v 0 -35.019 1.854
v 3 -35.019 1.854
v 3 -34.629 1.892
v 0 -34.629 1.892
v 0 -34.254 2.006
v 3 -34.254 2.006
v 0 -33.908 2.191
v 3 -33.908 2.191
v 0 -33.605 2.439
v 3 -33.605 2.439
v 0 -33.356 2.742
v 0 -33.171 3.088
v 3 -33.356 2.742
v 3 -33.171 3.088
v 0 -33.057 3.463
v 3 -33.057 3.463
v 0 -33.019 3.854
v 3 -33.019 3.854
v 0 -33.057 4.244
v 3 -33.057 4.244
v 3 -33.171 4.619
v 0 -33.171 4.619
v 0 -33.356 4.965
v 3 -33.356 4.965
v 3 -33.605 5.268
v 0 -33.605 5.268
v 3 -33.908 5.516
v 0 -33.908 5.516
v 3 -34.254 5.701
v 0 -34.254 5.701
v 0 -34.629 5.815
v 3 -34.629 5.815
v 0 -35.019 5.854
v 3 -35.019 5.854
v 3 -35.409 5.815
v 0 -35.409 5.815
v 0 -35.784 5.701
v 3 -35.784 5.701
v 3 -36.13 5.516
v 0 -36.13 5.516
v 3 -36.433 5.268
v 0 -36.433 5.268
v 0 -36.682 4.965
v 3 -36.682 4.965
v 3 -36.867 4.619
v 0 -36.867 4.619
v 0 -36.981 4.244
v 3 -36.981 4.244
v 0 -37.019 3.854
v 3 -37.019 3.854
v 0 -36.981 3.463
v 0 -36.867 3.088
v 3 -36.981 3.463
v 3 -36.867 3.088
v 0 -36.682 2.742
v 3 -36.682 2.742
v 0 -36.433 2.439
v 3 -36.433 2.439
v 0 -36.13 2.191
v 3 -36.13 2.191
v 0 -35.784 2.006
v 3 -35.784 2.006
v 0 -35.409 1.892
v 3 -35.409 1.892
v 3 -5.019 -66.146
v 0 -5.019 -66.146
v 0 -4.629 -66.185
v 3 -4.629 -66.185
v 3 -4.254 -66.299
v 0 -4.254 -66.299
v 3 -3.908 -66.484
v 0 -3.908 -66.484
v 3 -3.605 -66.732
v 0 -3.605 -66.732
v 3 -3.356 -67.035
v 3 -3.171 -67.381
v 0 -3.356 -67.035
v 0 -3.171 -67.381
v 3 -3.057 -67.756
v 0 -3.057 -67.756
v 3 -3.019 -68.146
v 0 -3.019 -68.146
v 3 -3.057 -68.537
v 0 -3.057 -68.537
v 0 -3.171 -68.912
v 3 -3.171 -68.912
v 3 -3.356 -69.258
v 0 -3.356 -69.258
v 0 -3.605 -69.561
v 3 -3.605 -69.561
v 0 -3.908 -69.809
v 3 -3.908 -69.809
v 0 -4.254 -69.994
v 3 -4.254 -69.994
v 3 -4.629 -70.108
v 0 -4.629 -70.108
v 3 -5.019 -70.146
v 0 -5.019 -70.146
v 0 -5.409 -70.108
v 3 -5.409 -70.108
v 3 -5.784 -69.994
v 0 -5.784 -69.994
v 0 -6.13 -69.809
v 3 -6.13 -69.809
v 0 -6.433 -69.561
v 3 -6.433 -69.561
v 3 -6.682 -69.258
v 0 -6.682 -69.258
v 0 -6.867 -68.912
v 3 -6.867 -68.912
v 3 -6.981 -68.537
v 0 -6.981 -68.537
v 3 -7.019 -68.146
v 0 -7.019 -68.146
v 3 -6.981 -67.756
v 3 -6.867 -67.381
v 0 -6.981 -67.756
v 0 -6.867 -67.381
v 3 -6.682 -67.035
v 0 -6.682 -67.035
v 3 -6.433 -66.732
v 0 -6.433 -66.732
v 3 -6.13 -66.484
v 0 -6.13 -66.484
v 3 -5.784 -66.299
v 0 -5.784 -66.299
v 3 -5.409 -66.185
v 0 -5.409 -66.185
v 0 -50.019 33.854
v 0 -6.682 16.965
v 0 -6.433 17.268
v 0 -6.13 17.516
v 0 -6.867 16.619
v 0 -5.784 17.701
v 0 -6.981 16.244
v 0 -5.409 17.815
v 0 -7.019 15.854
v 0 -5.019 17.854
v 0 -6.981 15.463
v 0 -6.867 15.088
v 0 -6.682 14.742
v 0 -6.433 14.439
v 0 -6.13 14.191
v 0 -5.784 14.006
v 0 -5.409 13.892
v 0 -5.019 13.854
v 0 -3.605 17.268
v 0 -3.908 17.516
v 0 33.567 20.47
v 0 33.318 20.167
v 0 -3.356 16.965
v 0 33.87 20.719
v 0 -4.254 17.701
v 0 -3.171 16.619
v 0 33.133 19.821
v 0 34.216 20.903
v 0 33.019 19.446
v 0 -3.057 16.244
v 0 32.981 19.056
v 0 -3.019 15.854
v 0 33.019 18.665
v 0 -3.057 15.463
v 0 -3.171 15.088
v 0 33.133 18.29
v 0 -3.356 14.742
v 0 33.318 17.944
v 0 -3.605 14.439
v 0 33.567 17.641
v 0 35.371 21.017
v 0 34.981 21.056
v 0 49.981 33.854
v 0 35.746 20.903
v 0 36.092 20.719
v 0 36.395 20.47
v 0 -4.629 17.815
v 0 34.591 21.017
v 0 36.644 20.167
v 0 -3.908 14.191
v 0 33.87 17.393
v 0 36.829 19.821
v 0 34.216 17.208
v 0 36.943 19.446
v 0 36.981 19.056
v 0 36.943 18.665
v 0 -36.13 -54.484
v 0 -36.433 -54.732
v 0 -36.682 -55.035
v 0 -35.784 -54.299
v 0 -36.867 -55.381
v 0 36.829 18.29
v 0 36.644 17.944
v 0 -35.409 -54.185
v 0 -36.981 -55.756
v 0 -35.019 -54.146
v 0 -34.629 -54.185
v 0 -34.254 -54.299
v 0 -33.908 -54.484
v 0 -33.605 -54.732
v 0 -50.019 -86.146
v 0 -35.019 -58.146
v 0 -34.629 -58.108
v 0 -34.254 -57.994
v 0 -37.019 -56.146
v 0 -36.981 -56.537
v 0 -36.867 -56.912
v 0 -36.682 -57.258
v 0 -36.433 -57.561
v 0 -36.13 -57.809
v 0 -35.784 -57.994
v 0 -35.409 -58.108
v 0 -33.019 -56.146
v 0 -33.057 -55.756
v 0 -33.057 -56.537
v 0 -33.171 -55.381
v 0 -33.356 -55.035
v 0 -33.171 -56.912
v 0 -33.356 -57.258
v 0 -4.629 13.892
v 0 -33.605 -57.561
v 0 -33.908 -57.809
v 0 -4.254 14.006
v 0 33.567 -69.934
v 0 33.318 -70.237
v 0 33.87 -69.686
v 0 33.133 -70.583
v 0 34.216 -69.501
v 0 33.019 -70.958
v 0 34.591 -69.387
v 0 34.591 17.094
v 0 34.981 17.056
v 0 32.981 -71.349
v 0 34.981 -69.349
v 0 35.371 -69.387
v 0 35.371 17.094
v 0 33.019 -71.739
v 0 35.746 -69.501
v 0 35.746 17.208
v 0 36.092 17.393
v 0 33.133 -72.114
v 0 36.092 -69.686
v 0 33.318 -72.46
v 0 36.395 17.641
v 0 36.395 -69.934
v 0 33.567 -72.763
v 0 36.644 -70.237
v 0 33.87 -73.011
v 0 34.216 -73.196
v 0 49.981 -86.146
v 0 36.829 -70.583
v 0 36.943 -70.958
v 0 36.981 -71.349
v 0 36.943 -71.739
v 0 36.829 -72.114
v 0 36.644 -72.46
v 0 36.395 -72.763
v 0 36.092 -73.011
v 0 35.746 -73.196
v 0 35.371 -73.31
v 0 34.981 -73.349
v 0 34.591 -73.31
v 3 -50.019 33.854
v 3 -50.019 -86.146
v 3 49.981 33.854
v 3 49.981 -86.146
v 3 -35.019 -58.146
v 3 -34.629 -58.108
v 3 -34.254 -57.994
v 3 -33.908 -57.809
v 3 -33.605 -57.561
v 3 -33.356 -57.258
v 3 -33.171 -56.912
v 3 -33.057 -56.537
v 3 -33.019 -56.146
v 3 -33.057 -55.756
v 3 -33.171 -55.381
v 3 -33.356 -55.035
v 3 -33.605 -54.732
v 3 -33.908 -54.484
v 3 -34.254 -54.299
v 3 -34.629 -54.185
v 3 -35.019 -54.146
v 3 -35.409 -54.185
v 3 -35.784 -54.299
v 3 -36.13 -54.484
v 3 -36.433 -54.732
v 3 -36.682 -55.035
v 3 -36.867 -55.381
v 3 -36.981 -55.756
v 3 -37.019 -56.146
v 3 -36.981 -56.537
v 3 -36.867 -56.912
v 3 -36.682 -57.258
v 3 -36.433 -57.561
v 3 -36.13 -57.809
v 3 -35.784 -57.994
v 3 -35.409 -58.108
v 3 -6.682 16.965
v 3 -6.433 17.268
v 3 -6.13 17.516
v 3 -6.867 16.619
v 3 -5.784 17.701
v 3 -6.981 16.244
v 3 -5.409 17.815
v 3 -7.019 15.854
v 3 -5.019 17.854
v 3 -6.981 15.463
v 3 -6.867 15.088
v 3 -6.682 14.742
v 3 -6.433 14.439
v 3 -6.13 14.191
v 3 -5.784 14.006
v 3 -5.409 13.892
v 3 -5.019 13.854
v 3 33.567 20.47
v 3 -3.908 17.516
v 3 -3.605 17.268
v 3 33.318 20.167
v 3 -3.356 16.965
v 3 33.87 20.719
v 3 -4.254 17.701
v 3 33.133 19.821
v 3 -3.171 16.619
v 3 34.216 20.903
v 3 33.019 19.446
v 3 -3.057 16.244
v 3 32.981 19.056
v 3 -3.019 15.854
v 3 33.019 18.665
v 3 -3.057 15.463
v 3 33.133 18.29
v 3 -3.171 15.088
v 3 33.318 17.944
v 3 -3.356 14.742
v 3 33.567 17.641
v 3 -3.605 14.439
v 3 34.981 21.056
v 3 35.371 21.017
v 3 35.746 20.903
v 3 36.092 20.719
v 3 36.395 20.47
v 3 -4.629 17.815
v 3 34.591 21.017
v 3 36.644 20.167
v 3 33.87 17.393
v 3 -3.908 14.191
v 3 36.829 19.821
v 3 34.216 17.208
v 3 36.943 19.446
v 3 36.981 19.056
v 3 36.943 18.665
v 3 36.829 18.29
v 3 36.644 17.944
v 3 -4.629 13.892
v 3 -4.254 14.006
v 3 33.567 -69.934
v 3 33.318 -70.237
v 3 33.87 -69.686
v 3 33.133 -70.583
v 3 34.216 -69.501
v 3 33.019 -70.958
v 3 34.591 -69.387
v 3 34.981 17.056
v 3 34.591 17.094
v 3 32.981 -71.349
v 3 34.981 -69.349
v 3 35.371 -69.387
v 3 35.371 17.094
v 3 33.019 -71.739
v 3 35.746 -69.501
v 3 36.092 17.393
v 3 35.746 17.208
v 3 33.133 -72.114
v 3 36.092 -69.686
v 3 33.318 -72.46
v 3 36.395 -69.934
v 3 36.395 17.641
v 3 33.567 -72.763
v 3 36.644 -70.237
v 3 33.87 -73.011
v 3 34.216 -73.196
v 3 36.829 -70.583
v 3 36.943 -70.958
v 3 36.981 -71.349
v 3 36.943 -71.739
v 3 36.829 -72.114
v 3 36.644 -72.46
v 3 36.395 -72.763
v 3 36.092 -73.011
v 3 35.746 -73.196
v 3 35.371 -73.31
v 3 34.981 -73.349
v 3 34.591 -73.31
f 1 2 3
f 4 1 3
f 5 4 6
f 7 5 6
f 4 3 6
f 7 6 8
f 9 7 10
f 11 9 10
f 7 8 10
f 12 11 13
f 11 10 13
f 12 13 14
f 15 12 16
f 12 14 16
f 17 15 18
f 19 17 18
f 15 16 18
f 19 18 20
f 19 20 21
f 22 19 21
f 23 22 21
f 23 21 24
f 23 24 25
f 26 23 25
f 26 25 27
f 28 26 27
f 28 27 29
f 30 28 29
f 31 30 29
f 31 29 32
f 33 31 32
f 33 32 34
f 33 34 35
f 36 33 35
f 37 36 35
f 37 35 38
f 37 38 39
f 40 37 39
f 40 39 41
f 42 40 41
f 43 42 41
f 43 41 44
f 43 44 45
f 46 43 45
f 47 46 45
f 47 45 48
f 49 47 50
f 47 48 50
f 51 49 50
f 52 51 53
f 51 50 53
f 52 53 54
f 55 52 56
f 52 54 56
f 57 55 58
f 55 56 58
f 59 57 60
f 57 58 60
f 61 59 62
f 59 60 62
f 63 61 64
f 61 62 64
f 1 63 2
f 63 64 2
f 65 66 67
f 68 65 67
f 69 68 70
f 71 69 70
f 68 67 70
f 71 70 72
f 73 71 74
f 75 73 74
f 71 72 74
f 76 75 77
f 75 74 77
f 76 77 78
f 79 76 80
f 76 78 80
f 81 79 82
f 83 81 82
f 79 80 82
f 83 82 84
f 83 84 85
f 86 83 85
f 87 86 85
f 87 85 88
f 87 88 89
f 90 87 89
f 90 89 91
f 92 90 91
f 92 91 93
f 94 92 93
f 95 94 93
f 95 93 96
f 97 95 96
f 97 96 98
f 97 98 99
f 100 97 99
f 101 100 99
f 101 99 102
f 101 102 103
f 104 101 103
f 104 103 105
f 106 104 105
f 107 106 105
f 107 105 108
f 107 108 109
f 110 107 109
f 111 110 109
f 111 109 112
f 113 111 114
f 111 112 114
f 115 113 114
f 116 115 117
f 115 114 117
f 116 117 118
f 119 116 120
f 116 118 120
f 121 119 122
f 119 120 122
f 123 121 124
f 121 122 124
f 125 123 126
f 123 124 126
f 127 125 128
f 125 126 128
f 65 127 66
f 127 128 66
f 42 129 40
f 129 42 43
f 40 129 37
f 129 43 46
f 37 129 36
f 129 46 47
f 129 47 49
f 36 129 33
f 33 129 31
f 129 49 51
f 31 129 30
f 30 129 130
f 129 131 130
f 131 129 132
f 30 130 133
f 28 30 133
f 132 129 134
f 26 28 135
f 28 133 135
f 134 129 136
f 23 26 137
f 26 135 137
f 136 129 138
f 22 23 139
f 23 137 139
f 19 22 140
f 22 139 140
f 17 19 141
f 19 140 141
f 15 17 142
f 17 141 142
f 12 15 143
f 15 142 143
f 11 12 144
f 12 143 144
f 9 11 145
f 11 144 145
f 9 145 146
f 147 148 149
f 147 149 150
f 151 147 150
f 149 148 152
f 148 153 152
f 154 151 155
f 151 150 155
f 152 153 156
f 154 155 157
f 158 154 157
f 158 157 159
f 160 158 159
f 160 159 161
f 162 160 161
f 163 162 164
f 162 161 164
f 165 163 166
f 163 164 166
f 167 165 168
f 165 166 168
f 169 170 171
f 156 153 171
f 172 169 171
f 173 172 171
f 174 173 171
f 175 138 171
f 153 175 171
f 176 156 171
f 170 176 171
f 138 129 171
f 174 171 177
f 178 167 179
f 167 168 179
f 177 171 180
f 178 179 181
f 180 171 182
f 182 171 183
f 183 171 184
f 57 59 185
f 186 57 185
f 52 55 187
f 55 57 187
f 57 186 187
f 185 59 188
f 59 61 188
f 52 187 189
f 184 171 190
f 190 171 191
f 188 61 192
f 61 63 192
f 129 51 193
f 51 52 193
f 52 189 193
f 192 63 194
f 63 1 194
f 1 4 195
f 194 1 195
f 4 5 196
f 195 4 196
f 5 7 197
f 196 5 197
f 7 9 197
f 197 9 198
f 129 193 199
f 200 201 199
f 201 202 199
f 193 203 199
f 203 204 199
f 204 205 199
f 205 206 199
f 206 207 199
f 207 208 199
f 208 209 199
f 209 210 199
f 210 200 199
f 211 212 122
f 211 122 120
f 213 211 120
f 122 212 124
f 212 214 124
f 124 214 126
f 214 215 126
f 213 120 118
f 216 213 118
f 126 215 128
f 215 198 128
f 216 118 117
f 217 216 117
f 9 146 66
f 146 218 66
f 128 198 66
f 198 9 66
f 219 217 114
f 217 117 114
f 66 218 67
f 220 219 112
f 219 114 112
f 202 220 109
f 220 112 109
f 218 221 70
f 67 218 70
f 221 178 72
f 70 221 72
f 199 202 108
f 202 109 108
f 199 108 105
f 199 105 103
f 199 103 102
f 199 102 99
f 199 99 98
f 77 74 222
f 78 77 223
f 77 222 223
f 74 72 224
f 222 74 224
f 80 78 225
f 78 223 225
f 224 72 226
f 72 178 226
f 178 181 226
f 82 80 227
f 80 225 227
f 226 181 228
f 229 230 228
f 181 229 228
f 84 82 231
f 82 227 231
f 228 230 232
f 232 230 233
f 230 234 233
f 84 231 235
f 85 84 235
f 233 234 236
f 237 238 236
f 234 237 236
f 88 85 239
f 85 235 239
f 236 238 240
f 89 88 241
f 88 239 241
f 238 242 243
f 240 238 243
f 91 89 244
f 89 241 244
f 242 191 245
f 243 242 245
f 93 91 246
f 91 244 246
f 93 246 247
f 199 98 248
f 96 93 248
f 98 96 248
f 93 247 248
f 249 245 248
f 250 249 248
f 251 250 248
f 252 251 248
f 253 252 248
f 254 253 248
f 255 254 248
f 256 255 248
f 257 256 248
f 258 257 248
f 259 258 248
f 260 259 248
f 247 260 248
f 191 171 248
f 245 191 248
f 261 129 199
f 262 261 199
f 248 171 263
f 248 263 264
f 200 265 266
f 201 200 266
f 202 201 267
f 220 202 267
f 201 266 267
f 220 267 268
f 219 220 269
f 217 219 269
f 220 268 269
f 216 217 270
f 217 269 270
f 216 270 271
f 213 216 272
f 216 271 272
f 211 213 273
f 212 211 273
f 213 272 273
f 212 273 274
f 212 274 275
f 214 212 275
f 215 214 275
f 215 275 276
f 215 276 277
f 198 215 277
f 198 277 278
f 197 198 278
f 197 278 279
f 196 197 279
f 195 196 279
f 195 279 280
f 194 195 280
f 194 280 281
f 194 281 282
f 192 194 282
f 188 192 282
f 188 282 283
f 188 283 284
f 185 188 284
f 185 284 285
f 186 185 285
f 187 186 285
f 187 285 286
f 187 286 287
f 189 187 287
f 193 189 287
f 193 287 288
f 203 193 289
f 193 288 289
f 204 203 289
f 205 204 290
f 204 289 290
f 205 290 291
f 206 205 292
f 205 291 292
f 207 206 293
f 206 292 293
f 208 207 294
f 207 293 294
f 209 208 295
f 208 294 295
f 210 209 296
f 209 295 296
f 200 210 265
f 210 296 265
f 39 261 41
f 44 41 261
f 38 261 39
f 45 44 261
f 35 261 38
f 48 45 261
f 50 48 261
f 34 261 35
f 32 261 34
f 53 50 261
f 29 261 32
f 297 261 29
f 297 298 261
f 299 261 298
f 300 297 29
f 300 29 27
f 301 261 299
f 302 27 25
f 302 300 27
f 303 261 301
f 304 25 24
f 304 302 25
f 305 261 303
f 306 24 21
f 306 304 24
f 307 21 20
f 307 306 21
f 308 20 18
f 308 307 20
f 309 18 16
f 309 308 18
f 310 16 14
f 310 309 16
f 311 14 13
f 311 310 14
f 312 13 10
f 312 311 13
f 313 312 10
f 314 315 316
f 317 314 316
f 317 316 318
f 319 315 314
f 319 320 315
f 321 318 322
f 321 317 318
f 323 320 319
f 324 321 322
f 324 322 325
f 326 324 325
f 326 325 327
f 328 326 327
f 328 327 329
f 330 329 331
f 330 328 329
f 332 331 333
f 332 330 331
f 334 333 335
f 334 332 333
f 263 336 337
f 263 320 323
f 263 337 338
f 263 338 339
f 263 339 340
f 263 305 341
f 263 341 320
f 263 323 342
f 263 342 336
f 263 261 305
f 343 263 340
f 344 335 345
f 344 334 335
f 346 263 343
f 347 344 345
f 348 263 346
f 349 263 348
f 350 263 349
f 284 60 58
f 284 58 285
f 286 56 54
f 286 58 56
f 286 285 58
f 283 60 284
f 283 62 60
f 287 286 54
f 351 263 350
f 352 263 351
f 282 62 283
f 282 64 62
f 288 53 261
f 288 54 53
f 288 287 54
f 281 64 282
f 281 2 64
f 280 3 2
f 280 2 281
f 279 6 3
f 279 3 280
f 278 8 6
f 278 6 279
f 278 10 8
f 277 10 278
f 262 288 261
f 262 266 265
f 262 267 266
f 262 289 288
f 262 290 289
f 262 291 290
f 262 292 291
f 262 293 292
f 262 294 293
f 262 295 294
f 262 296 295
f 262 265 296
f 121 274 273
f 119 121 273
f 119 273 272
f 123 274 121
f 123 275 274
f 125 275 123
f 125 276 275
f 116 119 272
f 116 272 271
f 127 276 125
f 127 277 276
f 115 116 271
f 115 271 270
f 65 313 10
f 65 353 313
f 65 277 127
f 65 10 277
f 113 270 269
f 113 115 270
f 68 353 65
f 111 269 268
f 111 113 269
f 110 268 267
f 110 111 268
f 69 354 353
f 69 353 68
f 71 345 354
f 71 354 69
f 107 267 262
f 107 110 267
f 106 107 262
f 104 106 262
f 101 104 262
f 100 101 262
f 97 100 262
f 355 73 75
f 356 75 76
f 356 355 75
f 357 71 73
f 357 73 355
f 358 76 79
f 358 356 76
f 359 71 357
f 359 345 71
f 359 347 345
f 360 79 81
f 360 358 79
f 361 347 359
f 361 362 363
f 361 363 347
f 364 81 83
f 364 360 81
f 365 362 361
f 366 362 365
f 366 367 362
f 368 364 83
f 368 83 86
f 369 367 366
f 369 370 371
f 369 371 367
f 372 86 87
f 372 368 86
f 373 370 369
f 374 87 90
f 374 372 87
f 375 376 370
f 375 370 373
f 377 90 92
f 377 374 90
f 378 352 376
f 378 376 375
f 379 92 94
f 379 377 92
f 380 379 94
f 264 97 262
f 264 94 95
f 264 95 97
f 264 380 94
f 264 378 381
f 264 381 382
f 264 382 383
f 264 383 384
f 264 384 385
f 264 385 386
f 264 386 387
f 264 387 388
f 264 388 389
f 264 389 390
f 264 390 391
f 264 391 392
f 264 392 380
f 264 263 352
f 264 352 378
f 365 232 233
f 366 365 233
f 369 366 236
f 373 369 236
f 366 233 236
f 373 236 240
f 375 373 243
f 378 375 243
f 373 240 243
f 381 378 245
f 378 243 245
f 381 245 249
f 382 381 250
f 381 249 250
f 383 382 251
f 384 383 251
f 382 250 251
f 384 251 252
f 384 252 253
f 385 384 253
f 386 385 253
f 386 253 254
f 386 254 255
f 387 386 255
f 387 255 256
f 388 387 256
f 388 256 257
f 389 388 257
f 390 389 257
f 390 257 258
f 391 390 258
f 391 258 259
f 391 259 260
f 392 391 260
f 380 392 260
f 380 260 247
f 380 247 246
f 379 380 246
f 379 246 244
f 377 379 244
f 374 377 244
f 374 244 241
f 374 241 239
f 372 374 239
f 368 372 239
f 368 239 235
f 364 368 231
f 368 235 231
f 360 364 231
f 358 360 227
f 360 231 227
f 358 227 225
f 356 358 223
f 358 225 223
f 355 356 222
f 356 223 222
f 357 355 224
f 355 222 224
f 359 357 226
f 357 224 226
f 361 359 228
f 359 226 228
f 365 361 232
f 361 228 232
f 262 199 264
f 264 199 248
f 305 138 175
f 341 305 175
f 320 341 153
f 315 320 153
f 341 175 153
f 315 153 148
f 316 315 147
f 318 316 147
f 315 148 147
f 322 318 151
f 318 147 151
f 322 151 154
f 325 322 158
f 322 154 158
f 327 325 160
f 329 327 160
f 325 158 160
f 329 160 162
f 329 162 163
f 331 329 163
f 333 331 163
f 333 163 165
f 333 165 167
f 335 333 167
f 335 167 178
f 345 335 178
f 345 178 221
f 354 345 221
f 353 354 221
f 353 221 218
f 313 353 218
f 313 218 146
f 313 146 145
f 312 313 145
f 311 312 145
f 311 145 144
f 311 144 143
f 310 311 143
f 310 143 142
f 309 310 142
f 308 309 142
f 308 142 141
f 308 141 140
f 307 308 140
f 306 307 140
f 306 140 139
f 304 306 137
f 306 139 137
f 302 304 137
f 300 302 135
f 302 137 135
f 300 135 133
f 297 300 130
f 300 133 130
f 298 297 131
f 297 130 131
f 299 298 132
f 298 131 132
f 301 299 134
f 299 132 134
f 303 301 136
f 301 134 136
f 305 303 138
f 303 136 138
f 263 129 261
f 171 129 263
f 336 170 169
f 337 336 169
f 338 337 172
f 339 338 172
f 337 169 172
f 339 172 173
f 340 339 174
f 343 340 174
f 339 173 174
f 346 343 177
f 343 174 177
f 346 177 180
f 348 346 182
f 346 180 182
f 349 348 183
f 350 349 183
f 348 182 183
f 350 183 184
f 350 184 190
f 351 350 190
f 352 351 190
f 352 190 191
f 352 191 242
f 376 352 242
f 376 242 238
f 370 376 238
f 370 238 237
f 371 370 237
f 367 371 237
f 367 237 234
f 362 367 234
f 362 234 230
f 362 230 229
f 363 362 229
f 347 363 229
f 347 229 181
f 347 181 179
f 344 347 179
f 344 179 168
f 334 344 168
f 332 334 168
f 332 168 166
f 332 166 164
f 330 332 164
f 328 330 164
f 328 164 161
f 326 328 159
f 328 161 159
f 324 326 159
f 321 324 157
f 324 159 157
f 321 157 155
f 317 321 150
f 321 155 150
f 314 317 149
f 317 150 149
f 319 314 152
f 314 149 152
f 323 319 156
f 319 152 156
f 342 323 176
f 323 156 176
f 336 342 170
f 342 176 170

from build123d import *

# Parameters (mm, degrees)
SKETCH1_W           = 120
SKETCH1_H           = 100
BOSS_EXTRUDE1_DEPTH = 3
SKETCH2_R           = 2
CUT_EXTRUDE1_DEPTH  = 4
SKETCH3_R           = 2
CUT_EXTRUDE2_DEPTH  = 4
SKETCH4_R           = 2
CUT_EXTRUDE3_DEPTH  = 4


with BuildPart() as part:
    # Sketch1 → Boss-Extrude1 (new body)
    with BuildSketch(Plane(origin=(0, 0, 0), x_dir=(0, 0, -1), z_dir=(1, 0, 0))):
        with Locations((26.146465375, -0.01894847)):
            Rectangle(SKETCH1_W, SKETCH1_H)
    extrude(amount=BOSS_EXTRUDE1_DEPTH)

    # Sketch2 → Cut-Extrude1 (cut, through all)
    with BuildSketch(Plane(origin=(3, 0, 0), x_dir=(0, 0, -1), z_dir=(1, 0, 0))):
        with Locations((-3.853534625, -35.01894847)):
            Circle(SKETCH2_R)
        with Locations((56.146465375, -35.01894847)):
            Circle(SKETCH2_R)
    extrude(amount=-CUT_EXTRUDE1_DEPTH, mode=Mode.SUBTRACT)

    # Sketch3 → Cut-Extrude2 (cut, through all)
    with BuildSketch(Plane.ZY):
        with Locations((-68.146465375, -5.01894847)):
            Circle(SKETCH3_R)
        with Locations((15.853534625, -5.01894847)):
            Circle(SKETCH3_R)
    extrude(amount=-CUT_EXTRUDE2_DEPTH, mode=Mode.SUBTRACT)

    # Sketch4 → Cut-Extrude3 (cut, through all)
    with BuildSketch(Plane.ZY):
        with Locations((19.055575654, 34.98105153)):
            Circle(SKETCH4_R)
        with Locations((-71.348506404, 34.98105153)):
            Circle(SKETCH4_R)
    extrude(amount=-CUT_EXTRUDE3_DEPTH, mode=Mode.SUBTRACT)


solid = part.part
